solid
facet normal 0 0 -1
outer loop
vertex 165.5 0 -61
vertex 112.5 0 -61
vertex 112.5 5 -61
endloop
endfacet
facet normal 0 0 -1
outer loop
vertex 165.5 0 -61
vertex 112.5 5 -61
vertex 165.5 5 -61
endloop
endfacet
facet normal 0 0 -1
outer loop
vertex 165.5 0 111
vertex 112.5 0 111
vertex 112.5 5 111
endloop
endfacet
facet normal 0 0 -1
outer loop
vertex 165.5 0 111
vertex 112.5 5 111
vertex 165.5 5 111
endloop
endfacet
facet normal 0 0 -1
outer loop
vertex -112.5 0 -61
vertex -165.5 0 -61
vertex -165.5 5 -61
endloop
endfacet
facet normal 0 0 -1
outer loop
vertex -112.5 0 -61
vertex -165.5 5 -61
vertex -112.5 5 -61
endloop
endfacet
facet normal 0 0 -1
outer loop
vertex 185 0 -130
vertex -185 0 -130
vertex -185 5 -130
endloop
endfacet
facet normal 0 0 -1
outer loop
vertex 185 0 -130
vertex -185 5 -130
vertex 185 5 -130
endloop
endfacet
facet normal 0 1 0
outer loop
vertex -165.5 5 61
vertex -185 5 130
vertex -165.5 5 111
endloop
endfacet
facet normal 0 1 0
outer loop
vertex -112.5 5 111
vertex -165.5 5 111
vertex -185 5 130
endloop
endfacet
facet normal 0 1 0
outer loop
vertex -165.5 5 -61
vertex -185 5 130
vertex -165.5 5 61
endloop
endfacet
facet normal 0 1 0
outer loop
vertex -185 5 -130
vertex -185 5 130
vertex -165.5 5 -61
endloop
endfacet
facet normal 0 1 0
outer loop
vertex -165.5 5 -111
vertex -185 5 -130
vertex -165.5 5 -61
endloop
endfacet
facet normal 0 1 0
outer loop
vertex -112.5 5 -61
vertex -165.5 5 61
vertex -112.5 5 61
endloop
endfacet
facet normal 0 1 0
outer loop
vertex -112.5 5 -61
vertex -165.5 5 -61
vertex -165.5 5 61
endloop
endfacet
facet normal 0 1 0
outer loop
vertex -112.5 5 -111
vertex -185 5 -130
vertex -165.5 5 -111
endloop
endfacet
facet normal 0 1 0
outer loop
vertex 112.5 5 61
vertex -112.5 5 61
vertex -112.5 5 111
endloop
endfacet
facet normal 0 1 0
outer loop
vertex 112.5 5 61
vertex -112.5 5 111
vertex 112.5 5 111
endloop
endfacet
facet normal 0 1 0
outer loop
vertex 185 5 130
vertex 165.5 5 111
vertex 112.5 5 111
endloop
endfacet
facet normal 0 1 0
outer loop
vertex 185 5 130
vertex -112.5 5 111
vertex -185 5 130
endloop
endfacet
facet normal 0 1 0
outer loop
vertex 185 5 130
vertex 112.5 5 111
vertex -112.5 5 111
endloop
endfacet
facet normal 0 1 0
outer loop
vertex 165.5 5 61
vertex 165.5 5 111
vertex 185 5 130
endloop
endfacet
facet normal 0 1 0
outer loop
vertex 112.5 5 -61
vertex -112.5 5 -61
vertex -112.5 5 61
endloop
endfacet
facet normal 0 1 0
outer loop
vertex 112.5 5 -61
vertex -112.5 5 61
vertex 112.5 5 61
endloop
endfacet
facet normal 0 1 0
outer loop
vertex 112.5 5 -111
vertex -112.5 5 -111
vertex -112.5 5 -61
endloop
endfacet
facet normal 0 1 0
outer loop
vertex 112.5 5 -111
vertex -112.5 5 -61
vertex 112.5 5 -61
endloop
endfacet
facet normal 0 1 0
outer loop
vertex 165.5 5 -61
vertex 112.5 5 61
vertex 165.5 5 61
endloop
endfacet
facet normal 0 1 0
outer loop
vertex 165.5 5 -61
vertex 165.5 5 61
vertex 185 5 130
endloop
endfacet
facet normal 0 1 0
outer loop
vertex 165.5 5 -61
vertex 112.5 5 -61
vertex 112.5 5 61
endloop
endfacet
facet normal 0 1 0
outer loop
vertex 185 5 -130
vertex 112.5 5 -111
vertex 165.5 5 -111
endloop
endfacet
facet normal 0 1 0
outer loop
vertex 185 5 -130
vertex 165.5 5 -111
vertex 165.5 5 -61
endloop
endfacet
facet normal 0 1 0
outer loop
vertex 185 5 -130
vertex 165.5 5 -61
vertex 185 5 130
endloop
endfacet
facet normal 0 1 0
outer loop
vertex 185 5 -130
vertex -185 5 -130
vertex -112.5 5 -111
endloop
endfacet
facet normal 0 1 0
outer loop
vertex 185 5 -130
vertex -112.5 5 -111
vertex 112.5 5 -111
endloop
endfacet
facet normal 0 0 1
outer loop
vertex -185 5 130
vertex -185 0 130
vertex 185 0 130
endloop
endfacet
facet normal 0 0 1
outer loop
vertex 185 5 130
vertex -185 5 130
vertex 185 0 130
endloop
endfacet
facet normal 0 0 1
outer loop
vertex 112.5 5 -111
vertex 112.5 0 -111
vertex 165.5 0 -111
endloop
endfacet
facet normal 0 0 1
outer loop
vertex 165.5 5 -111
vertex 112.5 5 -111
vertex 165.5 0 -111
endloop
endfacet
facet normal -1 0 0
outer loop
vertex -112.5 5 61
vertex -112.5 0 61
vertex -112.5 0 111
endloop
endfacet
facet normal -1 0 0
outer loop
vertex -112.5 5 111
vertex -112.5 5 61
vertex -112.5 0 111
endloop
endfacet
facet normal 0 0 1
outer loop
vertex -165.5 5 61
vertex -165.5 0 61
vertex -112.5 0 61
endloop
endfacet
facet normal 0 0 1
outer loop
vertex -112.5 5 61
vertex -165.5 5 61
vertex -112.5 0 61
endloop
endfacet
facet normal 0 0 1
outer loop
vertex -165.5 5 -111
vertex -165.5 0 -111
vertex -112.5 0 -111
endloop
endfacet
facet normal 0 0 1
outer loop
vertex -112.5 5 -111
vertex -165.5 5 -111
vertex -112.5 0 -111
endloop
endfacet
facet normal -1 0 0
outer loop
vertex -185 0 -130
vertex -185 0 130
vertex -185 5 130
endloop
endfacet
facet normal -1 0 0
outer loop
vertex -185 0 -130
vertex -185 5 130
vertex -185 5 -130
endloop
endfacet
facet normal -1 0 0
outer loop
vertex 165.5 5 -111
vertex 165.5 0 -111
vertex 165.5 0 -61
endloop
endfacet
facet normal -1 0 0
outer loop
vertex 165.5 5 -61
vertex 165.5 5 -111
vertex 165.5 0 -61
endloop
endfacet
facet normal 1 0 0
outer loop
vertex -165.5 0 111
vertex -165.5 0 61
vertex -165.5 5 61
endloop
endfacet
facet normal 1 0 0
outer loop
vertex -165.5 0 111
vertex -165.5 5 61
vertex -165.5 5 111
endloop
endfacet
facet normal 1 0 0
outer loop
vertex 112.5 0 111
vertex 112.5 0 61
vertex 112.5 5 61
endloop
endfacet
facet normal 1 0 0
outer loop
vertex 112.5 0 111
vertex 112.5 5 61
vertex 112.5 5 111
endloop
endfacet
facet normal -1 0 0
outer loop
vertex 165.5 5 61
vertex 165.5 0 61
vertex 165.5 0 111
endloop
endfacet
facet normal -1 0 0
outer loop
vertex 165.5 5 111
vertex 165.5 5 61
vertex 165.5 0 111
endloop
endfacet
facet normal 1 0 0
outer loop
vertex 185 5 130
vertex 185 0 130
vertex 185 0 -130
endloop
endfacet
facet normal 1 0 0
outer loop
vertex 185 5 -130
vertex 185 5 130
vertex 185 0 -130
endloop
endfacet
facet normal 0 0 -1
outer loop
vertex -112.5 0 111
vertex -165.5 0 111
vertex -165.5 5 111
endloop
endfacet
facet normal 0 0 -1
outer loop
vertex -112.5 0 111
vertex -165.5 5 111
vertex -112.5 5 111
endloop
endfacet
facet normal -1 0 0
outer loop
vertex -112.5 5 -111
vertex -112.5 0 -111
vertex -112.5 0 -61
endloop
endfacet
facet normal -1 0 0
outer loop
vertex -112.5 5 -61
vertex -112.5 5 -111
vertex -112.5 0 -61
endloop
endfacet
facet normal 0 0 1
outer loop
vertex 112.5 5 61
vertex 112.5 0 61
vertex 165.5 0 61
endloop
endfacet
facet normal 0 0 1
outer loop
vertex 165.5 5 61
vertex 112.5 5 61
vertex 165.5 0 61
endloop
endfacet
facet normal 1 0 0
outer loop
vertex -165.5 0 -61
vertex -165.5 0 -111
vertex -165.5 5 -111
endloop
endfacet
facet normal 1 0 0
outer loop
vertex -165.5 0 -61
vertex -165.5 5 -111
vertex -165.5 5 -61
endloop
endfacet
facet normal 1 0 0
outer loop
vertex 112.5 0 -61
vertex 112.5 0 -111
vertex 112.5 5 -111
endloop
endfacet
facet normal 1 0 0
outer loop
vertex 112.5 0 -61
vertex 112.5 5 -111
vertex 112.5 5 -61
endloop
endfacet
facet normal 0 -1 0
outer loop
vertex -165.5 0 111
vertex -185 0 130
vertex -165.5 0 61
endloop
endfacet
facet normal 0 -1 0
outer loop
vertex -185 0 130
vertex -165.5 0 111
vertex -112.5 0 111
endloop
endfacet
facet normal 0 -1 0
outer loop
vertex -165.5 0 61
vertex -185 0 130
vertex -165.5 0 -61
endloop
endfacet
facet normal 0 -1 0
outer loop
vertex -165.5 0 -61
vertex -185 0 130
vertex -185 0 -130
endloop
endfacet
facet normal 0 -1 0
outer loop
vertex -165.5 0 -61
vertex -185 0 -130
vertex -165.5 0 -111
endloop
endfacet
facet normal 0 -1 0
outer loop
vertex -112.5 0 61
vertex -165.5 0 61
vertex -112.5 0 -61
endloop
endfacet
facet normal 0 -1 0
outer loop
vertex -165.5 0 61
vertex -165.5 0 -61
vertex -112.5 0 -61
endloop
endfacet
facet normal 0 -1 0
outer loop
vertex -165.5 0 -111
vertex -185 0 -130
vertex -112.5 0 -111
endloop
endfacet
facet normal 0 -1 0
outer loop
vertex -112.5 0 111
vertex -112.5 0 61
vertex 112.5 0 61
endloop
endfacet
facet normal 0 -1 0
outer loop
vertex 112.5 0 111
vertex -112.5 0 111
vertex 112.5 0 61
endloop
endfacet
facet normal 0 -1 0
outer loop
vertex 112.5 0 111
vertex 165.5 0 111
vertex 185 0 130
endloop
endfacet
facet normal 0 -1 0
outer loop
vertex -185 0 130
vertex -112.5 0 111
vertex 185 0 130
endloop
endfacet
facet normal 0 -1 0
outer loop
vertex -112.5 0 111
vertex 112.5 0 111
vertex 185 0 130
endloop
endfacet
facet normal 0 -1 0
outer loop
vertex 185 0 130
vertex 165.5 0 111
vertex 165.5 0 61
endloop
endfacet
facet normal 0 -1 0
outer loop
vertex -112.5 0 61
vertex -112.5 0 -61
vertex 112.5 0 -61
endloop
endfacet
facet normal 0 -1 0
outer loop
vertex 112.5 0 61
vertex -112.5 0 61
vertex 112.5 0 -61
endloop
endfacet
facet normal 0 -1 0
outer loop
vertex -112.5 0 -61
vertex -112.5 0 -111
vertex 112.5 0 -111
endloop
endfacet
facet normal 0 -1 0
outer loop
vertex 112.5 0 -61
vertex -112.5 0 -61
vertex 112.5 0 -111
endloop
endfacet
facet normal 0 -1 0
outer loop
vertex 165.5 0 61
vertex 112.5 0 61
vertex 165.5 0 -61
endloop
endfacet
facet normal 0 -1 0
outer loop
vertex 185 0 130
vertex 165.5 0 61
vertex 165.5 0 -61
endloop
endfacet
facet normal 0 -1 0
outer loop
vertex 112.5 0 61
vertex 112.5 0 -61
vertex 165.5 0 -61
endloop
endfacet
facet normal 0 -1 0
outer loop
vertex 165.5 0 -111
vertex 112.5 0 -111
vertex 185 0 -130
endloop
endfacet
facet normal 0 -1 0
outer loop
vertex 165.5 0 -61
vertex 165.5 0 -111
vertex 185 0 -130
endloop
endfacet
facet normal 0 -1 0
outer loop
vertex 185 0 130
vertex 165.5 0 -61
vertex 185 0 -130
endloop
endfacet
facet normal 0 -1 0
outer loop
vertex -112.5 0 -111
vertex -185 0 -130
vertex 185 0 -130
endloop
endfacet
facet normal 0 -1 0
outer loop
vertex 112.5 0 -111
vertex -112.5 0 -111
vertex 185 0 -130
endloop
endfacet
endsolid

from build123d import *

# Parameters (mm, degrees)
SKETCH1_W           = 370
SKETCH1_H           = 260
BOSS_EXTRUDE1_DEPTH = 5
SKETCH3_W           = 53
SKETCH3_H           = 50
CUT_EXTRUDE3_DEPTH  = 10


with BuildPart() as part:
    # Sketch1 → Boss-Extrude1 (new body)
    with BuildSketch(Plane(origin=(0, 0, 0), x_dir=(1, 0, 0), z_dir=(0, 1, 0))):
        Rectangle(SKETCH1_W, SKETCH1_H)
    extrude(amount=BOSS_EXTRUDE1_DEPTH)

    # Sketch3 → Cut-Extrude3 (cut)
    with BuildSketch(Plane.XZ):
        with Locations((-139, 86)):
            Rectangle(SKETCH3_W, SKETCH3_H)
        with Locations((-139, -86)):
            Rectangle(SKETCH3_W, SKETCH3_H)
        with Locations((139, 86)):
            Rectangle(SKETCH3_W, SKETCH3_H)
        with Locations((139, -86)):
            Rectangle(SKETCH3_W, SKETCH3_H)
    extrude(amount=-CUT_EXTRUDE3_DEPTH, mode=Mode.SUBTRACT)


solid = part.part
